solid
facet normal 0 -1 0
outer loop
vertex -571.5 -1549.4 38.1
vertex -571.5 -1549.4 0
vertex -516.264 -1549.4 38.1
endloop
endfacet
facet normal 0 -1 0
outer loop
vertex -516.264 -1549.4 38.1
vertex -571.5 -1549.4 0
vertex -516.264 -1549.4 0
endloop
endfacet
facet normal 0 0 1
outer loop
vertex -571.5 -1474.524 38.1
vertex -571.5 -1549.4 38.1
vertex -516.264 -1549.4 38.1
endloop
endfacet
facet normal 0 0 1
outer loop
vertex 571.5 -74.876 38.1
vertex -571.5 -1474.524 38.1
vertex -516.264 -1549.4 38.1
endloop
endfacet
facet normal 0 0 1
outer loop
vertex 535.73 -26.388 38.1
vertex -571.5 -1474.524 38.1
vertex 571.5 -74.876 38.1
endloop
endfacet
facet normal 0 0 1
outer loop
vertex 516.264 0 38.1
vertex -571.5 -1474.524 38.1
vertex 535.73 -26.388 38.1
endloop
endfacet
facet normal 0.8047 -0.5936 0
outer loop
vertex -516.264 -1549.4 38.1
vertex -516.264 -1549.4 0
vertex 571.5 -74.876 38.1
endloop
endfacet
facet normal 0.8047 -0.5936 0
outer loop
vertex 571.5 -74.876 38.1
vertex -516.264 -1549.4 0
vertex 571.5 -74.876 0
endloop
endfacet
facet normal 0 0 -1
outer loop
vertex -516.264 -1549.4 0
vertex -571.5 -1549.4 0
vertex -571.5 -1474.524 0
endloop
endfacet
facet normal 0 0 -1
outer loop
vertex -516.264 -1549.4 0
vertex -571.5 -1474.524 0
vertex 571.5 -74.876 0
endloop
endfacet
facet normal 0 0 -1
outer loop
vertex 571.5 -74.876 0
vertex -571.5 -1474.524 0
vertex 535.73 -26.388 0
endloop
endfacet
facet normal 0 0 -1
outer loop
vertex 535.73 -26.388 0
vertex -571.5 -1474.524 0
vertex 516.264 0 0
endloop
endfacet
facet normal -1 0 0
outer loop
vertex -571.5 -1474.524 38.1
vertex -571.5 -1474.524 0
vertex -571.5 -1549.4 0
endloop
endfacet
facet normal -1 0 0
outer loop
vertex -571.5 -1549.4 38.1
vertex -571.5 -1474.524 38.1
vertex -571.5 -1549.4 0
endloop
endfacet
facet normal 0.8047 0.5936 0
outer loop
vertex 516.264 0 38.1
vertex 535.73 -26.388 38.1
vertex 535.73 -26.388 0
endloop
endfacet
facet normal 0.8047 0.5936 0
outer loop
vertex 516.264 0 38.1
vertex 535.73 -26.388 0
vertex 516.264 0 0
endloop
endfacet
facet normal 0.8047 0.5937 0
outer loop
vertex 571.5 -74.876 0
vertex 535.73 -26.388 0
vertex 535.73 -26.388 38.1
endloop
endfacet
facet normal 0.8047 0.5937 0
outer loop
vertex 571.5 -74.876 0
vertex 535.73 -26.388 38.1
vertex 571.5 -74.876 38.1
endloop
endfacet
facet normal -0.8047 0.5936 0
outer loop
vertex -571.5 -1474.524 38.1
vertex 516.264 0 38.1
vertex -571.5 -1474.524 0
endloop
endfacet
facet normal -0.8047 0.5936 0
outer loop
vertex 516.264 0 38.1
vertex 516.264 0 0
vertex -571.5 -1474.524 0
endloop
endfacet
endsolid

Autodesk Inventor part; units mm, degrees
ref_plane "YZ Plane" through (0, 0, 0) normal (1, 0, 0) x (0, 1, 0)
ref_plane "XZ Plane" through (0, 0, 0) normal (0, 1, 0) x (-1, 0, 0)
ref_plane "XY Plane" through (0, 0, 0) normal (0, 0, 1) x (1, 0, 0)
sketch "Sketch1" plane through (0, 0, 0) normal (0, 0, 1) x (1, 0, 0)
  line L0 (-571.5, -1549.4) -> (571.5, -1549.4)
  line L1 (571.5, -1549.4) -> (571.5, 1549.4)
  line L2 (571.5, 1549.4) -> (-571.5, 1549.4)
  line L3 (-571.5, 1549.4) -> (-571.5, -1549.4)
  line L4 (-571.5, -1549.4) -> (571.5, 1549.4) construction
  line L5 (571.5, -1549.4) -> (-571.5, 1549.4) construction
  line L6 (-571.5, 0) -> (571.5, 0)
  line L7 (571.5, 0) -> (-571.5, -1549.4)
  line L8 (-535.73, -1575.7877) -> (-607.27, -1523.0123)
  line L9 (607.27, -26.3877) -> (535.73, 26.3877)
  line L10 (535.73, 26.3877) -> (-607.27, -1523.0123)
  line L11 (-535.73, -1575.7877) -> (607.27, -26.3877)
  line L12 (535.73, 26.3877) -> (571.5, 74.8759)
  line L13 (-571.5, 1549.4) -> (571.5, -1549.4) construction
  line L14 (571.5, 0) -> (-571.5, 1549.4)
  line L15 (-535.73, 1575.7877) -> (-607.27, 1523.0123)
  line L16 (607.27, 26.3877) -> (535.73, -26.3877)
  line L17 (535.73, -26.3877) -> (-607.27, 1523.0123)
  line L18 (-535.73, 1575.7877) -> (607.27, 26.3877)
  line L19 (535.73, -26.3877) -> (571.5, -74.8759)
  point P0 (0, 0)
  point P1 (571.5, 74.8759)
  point P2 (-516.2637, 1549.4)
  point P3 (-571.5, 1474.5241)
  point P4 (571.5, -74.8759)
  point P5 (571.5, -74.8759)
  point P6 (516.2637, 0)
  point P7 (-571.5, -1474.5241)
  point P8 (-516.2637, -1549.4)
  dimension "d0" = 1143
  dimension "d1" = 3098.8
  dimension "d3" = 88.9
  dimension "d4" = 88.9
extrude "Extrusion1" add sketch "Sketch1" along normal blind 38.1 contours L7 L19 L11 L0 | L3 L10 L17 L19 L7
properties part number "74+"
